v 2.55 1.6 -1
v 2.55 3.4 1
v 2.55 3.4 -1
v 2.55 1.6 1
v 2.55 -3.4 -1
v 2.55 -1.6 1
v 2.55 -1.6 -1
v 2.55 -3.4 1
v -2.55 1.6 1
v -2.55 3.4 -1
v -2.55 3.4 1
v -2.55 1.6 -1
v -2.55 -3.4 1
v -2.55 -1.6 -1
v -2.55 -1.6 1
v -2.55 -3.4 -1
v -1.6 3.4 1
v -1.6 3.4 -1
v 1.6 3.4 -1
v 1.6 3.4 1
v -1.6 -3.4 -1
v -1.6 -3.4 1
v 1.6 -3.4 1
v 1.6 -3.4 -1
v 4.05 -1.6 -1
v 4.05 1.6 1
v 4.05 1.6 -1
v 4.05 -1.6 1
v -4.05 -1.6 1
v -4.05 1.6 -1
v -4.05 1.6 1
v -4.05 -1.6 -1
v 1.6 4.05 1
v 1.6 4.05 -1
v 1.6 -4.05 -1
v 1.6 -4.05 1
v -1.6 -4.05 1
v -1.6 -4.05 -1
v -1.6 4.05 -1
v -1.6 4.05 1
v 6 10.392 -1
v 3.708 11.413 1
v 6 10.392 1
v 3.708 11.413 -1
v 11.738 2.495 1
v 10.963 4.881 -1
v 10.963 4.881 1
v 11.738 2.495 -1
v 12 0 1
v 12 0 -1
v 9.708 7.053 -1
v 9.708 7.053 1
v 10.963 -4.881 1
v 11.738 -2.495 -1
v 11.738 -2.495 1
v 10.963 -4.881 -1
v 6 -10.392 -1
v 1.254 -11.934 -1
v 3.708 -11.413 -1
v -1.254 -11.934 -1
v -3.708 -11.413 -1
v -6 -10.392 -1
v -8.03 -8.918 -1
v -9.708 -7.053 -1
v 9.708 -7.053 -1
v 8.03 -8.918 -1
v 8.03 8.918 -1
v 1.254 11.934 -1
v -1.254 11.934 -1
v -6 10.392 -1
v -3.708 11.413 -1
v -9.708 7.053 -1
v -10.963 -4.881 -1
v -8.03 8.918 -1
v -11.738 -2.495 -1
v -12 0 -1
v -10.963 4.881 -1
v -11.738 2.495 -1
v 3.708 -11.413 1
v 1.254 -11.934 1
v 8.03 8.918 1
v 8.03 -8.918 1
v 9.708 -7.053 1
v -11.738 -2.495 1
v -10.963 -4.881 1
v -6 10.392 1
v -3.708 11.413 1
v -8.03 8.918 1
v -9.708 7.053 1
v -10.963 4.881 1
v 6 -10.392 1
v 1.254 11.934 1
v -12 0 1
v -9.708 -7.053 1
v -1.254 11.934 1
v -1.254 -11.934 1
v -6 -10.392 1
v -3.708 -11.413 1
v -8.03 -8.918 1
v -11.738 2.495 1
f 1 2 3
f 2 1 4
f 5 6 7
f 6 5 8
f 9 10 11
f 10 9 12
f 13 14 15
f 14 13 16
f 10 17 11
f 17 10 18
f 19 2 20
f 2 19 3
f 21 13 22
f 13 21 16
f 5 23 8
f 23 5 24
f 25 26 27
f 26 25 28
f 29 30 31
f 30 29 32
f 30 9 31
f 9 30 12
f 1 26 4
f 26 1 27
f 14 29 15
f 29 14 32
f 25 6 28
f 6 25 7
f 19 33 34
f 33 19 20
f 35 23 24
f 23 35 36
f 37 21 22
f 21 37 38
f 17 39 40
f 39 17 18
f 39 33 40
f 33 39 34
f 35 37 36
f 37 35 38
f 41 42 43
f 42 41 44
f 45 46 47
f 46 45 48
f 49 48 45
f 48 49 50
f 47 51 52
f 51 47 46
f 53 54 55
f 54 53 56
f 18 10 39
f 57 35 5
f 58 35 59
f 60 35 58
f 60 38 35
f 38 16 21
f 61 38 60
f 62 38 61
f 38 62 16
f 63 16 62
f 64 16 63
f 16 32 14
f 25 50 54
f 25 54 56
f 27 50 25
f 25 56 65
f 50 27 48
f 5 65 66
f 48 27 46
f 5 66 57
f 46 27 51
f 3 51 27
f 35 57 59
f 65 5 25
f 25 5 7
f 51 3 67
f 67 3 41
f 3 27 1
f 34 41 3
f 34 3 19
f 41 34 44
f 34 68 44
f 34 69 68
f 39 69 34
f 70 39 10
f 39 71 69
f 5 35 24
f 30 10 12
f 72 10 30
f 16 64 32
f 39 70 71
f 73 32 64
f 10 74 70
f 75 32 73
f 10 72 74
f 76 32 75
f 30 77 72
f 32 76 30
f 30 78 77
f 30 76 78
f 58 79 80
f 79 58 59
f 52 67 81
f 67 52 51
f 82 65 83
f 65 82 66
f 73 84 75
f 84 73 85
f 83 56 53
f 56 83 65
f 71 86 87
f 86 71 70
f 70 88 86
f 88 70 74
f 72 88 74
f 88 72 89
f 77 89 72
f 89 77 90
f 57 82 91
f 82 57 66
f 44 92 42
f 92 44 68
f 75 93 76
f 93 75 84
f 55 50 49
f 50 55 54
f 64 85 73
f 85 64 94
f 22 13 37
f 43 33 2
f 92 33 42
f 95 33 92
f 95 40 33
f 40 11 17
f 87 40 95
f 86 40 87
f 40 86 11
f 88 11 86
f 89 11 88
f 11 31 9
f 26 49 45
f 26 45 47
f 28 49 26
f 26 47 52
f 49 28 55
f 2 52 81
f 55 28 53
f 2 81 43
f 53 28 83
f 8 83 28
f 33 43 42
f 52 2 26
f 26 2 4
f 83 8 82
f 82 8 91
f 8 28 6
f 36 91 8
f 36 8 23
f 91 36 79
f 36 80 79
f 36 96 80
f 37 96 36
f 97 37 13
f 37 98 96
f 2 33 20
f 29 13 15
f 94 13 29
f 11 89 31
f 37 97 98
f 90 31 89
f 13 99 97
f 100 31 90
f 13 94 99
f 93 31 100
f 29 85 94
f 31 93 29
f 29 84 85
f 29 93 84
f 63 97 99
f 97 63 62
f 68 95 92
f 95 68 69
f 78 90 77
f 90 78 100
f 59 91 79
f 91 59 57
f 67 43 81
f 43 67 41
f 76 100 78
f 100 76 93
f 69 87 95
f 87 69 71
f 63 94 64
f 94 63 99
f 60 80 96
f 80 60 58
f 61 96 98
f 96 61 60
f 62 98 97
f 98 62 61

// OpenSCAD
difference() {
    cylinder(2, 12, 12, true);
    union () {
        cube([5.1,6.8,10],true);
        cube([8.1,3.2,10],true);
        cube([3.2,8.1,10],true);
    }
}
